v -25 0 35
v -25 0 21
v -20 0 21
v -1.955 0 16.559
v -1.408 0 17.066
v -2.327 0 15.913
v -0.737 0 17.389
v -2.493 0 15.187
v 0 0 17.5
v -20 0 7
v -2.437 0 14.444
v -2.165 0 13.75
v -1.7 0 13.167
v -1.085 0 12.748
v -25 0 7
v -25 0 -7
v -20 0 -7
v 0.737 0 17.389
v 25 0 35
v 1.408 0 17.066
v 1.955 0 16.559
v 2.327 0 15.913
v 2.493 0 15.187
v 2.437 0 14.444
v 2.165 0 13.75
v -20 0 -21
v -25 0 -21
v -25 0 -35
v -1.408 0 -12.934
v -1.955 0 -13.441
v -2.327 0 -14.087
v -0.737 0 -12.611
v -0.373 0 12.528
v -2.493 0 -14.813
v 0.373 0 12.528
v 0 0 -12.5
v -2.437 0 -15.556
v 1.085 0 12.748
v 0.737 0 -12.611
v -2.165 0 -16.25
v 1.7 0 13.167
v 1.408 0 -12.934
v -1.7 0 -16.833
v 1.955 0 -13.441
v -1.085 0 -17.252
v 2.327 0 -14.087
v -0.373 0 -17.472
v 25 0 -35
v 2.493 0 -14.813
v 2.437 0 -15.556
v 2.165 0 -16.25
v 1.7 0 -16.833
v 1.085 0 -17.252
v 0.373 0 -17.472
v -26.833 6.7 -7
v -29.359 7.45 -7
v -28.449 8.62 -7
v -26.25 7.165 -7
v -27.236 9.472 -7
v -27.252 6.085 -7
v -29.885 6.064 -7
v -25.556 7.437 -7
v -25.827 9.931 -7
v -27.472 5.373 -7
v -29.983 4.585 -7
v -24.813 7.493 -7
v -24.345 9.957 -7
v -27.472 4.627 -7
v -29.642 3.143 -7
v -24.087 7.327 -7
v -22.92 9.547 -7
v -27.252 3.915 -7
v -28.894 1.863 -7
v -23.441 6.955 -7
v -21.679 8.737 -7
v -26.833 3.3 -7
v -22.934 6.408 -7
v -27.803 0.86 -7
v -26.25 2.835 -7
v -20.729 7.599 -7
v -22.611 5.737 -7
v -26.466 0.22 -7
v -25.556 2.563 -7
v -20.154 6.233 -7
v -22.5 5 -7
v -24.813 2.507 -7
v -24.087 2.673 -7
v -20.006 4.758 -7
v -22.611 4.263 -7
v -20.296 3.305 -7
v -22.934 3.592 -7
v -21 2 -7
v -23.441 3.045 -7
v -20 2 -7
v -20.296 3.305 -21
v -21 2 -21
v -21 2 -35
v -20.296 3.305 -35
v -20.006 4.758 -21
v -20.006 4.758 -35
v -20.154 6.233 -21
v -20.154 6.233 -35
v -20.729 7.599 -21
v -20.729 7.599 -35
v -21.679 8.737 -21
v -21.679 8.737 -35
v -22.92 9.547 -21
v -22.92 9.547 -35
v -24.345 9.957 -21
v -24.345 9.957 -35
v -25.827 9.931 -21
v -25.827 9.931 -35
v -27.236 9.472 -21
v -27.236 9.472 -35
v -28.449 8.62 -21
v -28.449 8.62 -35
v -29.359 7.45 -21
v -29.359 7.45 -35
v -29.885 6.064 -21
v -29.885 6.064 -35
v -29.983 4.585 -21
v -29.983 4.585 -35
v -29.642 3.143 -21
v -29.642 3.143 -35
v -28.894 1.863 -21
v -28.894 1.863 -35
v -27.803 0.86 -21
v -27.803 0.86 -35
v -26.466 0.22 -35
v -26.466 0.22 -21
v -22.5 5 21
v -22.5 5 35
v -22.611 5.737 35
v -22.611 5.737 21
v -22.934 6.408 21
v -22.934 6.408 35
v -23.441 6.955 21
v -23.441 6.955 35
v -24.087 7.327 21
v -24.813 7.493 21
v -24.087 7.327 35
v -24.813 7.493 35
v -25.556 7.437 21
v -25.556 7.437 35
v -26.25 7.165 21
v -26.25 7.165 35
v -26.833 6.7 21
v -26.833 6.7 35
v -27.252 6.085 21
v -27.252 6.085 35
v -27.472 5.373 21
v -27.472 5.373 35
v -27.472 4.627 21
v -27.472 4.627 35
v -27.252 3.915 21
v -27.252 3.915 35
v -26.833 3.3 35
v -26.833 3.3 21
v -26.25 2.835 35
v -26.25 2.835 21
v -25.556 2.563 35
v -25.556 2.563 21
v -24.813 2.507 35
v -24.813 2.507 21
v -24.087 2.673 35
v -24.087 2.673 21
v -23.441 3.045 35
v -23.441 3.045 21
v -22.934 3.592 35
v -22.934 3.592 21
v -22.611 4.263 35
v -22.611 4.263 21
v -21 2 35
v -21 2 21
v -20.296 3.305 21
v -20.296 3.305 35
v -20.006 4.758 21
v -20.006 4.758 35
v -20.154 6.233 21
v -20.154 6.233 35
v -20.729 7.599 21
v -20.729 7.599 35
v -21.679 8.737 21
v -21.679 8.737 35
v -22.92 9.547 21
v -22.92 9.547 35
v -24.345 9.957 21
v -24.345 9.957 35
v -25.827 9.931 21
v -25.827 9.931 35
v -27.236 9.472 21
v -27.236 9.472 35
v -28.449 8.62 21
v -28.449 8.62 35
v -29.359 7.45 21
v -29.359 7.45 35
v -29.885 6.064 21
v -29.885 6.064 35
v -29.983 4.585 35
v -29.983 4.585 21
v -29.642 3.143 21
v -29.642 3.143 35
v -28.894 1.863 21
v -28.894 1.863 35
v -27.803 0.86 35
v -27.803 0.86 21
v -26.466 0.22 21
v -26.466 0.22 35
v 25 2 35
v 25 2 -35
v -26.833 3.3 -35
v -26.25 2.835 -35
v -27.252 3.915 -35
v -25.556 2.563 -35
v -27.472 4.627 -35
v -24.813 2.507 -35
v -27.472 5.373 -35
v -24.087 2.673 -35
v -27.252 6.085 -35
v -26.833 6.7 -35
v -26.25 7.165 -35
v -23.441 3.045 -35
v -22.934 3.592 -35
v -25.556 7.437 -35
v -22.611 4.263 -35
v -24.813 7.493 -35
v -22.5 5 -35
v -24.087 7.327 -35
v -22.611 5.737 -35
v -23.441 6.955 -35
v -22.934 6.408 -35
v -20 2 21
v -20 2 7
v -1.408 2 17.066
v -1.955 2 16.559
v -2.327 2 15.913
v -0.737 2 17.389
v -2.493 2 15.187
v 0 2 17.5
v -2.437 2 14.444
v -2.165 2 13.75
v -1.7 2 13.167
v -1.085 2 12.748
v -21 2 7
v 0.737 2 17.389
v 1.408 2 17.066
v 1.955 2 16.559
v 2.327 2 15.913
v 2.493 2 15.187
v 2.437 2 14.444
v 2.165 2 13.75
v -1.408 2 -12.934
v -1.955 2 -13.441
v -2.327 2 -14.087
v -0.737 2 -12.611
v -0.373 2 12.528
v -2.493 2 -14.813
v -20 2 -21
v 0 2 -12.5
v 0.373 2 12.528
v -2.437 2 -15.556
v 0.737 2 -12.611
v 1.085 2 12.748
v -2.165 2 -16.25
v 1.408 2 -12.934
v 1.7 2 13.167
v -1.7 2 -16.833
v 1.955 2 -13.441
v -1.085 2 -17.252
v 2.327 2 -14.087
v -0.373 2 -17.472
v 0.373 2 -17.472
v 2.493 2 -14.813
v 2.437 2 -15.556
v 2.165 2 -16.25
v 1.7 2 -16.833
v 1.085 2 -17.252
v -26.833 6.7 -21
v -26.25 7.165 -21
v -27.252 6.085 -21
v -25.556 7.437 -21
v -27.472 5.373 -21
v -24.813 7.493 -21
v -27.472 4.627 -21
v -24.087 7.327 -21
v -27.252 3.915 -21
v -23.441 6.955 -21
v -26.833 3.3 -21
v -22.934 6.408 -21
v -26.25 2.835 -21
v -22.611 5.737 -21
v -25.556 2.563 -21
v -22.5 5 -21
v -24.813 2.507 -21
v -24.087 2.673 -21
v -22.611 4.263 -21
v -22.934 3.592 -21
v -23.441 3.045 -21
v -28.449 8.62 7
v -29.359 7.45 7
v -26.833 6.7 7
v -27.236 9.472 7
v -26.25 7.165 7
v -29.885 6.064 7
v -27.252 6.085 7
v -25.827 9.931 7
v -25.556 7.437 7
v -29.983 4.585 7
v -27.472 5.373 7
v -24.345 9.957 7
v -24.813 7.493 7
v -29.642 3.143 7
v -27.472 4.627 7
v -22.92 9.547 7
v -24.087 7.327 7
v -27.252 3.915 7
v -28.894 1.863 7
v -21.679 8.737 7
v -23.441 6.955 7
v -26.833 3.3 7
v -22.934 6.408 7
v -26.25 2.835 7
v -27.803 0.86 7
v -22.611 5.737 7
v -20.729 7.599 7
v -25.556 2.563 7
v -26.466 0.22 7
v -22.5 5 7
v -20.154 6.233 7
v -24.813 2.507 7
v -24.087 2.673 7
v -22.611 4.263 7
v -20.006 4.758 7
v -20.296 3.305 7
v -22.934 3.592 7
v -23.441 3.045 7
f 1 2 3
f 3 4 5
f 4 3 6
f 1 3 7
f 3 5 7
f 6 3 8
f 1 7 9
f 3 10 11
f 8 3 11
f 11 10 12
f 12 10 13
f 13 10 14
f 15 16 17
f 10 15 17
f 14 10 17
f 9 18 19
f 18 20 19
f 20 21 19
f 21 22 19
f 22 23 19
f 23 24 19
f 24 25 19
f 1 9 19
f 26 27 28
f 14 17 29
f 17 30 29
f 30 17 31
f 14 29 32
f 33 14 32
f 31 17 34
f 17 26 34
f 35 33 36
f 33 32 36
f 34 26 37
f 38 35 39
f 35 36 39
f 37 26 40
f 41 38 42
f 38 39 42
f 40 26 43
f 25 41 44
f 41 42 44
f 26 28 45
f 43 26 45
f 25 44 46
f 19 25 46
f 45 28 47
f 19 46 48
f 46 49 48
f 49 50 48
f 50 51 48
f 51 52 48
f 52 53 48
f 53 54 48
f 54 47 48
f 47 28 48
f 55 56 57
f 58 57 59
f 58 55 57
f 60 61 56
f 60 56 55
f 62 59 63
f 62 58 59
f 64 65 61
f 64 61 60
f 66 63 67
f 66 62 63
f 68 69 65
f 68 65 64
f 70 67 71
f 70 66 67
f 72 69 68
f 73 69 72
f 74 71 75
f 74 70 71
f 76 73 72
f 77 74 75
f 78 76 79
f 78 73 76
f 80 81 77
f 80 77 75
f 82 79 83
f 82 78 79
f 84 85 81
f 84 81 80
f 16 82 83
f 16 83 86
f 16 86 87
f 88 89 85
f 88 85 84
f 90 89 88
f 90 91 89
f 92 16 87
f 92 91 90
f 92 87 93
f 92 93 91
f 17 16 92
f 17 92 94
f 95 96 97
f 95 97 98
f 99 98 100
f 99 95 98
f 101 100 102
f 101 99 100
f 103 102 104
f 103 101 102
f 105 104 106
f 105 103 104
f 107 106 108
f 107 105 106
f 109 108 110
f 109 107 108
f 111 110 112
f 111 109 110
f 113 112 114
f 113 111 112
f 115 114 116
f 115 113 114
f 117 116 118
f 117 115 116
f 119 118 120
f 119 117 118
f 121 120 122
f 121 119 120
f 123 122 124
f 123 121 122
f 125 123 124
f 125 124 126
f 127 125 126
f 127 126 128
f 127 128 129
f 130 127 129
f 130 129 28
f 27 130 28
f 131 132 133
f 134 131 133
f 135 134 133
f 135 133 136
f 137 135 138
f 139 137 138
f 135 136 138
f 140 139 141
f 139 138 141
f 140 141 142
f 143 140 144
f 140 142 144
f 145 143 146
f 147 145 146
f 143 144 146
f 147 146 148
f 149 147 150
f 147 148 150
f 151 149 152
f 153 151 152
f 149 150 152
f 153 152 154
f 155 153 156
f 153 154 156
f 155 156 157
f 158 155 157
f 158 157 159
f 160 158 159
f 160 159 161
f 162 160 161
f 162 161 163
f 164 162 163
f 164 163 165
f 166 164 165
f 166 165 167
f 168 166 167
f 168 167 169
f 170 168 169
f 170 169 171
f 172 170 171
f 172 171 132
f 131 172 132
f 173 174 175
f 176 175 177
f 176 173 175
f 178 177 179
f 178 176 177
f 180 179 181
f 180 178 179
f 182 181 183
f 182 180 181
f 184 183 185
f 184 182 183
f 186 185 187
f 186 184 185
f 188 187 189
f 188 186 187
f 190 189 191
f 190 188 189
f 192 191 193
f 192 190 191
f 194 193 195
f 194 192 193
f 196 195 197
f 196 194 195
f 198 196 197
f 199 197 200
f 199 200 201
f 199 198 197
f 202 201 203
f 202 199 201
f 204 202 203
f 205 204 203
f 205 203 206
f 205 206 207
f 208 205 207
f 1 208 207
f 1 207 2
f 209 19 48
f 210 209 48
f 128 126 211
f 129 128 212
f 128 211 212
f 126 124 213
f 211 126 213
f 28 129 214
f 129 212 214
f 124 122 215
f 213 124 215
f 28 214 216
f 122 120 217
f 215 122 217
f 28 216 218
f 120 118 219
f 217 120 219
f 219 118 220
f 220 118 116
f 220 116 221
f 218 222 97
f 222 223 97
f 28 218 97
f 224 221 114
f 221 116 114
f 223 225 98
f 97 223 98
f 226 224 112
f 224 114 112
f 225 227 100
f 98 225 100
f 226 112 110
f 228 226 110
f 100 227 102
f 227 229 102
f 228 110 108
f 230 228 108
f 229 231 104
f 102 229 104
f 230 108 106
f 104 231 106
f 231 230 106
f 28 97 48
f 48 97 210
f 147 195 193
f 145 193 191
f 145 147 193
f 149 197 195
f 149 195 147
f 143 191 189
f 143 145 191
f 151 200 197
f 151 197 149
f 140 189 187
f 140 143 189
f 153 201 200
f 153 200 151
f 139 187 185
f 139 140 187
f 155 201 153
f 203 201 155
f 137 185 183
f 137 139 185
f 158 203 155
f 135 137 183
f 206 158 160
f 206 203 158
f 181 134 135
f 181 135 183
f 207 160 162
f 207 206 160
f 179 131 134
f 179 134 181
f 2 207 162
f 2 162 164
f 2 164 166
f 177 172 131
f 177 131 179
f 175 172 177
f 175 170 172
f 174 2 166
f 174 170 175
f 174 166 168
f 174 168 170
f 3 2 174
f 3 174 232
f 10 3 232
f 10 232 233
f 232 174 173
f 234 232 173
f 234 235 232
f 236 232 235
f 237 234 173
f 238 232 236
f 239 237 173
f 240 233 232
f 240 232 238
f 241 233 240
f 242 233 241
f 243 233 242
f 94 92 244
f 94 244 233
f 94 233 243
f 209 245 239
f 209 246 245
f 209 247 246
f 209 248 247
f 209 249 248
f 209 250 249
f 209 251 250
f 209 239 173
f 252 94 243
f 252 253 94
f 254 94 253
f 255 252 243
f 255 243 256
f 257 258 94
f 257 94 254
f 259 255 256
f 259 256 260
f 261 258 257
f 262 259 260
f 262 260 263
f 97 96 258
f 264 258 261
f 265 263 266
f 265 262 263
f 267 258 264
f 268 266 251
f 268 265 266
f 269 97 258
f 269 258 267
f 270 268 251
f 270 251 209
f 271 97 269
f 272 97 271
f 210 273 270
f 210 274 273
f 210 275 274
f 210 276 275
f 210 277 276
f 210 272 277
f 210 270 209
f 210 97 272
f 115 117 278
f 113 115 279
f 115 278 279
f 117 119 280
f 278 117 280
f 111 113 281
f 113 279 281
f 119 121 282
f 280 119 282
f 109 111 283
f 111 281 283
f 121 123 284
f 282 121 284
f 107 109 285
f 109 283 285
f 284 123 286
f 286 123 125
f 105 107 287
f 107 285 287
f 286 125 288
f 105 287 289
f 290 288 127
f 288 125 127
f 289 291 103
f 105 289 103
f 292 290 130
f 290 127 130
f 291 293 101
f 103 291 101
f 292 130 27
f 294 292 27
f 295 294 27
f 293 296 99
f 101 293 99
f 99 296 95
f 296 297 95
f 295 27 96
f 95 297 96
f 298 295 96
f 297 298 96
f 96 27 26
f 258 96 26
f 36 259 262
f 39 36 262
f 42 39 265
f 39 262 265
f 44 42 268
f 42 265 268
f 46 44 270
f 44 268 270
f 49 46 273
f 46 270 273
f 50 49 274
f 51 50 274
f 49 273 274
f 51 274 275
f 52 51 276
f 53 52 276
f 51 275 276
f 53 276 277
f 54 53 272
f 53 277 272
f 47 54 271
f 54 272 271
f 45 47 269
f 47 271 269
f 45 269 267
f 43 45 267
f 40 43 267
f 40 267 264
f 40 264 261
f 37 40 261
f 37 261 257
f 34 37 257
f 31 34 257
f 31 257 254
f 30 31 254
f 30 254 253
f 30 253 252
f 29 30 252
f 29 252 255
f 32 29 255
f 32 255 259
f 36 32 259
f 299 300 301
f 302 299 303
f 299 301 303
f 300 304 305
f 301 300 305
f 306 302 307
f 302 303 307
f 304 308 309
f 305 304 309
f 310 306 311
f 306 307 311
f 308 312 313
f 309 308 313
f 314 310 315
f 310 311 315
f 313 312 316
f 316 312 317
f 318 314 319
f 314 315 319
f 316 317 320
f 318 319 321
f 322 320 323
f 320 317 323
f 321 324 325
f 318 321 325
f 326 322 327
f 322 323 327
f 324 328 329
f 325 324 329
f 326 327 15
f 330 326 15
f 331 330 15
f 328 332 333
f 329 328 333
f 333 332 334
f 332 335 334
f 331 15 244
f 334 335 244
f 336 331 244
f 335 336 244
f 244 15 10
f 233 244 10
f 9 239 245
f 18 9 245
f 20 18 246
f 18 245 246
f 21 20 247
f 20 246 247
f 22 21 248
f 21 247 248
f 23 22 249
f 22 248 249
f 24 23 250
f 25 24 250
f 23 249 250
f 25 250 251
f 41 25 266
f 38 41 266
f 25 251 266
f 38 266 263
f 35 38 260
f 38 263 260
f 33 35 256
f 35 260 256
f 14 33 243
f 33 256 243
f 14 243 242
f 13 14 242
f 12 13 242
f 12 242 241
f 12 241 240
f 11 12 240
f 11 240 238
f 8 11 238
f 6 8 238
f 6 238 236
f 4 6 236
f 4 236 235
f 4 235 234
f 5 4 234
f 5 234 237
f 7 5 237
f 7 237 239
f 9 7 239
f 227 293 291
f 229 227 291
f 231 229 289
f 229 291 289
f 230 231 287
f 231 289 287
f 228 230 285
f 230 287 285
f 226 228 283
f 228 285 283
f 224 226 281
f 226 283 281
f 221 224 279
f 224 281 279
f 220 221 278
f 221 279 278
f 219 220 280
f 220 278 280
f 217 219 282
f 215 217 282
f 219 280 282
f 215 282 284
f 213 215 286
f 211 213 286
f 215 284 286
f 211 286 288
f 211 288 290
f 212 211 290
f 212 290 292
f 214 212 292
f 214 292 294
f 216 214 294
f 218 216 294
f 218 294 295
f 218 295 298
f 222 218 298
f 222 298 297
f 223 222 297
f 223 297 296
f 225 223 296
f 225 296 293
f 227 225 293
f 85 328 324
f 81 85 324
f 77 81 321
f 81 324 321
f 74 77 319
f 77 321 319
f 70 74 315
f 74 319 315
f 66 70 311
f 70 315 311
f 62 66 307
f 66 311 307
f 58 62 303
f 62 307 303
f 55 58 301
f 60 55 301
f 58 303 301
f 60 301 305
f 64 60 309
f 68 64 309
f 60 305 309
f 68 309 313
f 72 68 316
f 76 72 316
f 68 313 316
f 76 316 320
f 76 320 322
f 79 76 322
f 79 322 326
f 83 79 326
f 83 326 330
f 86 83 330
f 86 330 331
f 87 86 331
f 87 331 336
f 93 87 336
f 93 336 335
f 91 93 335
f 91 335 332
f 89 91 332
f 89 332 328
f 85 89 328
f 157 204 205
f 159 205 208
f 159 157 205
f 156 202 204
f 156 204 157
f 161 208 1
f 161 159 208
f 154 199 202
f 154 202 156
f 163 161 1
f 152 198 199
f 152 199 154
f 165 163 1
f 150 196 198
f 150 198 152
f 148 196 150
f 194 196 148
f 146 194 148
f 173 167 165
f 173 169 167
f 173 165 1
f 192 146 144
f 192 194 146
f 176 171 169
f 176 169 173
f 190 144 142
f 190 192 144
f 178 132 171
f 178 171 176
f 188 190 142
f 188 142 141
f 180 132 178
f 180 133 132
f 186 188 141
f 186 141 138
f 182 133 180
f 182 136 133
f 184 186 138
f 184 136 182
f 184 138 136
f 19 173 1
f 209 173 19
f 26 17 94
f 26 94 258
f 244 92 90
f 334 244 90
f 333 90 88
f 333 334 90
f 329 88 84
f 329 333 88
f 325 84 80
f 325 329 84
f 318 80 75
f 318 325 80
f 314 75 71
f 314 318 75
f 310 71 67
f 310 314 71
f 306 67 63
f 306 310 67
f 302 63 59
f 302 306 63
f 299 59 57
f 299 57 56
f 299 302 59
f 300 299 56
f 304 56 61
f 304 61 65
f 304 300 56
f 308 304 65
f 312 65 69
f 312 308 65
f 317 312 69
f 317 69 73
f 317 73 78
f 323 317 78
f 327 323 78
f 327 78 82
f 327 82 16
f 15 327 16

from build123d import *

# Parameters (mm, degrees)
SKETCH1_W               = 50
SKETCH1_H               = 70
BOSS_EXTRUDE1_DEPTH     = 2
SKETCH2_R               = 5
SKETCH2_R_2             = 2.5
BOSS_EXTRUDE2_DEPTH     = 70
SKETCH3_R               = 2.5
CUT_EXTRUDE1_DEPTH      = 47.786750261
CUT_EXTRUDE2_DEPTH      = 47.786750261
CUT_EXTRUDE2_DEPTH_BACK = 47.786750261
SKETCH5_W               = 10
SKETCH5_H               = 14


with BuildPart() as part:
    # Sketch1 → Boss-Extrude1 (new body)
    with BuildSketch(Plane(origin=(0, 0, 0), x_dir=(1, 0, 0), z_dir=(0, 1, 0))):
        Rectangle(SKETCH1_W, SKETCH1_H)
    extrude(amount=BOSS_EXTRUDE1_DEPTH)

    # Sketch2 → Boss-Extrude2 (add)
    with BuildSketch(Plane.XY.offset(35)):
        with Locations((-25, 5)):
            Circle(SKETCH2_R)
        with Locations((-25, 5)):
            Circle(SKETCH2_R_2, mode=Mode.SUBTRACT)
    extrude(amount=-BOSS_EXTRUDE2_DEPTH)

    # Sketch3 → Cut-Extrude1 (cut, through all)
    with BuildSketch(Plane(origin=(0, 2, 0), x_dir=(1, 0, 0), z_dir=(0, 1, 0))):
        with Locations(Location((0, 15, 0), (0, 0, 270))):
            Circle(SKETCH3_R)
        with Locations(Location((0, -15, 0), (0, 0, 270))):
            Circle(SKETCH3_R)
    extrude(amount=-CUT_EXTRUDE1_DEPTH, mode=Mode.SUBTRACT)

    # Sketch5 → Cut-Extrude2 (cut, two sides: drawn at the far end of the back side and taken through both)
    with BuildSketch(Plane(origin=(0, 2, 0), x_dir=(1, 0, 0), z_dir=(0, 1, 0)).offset(-CUT_EXTRUDE2_DEPTH_BACK)):
        with Locations((-25, -14)):
            Rectangle(SKETCH5_W, SKETCH5_H)
        with Locations((-25, 14)):
            Rectangle(SKETCH5_W, SKETCH5_H)
    extrude(amount=CUT_EXTRUDE2_DEPTH + CUT_EXTRUDE2_DEPTH_BACK, mode=Mode.SUBTRACT)


solid = part.part
